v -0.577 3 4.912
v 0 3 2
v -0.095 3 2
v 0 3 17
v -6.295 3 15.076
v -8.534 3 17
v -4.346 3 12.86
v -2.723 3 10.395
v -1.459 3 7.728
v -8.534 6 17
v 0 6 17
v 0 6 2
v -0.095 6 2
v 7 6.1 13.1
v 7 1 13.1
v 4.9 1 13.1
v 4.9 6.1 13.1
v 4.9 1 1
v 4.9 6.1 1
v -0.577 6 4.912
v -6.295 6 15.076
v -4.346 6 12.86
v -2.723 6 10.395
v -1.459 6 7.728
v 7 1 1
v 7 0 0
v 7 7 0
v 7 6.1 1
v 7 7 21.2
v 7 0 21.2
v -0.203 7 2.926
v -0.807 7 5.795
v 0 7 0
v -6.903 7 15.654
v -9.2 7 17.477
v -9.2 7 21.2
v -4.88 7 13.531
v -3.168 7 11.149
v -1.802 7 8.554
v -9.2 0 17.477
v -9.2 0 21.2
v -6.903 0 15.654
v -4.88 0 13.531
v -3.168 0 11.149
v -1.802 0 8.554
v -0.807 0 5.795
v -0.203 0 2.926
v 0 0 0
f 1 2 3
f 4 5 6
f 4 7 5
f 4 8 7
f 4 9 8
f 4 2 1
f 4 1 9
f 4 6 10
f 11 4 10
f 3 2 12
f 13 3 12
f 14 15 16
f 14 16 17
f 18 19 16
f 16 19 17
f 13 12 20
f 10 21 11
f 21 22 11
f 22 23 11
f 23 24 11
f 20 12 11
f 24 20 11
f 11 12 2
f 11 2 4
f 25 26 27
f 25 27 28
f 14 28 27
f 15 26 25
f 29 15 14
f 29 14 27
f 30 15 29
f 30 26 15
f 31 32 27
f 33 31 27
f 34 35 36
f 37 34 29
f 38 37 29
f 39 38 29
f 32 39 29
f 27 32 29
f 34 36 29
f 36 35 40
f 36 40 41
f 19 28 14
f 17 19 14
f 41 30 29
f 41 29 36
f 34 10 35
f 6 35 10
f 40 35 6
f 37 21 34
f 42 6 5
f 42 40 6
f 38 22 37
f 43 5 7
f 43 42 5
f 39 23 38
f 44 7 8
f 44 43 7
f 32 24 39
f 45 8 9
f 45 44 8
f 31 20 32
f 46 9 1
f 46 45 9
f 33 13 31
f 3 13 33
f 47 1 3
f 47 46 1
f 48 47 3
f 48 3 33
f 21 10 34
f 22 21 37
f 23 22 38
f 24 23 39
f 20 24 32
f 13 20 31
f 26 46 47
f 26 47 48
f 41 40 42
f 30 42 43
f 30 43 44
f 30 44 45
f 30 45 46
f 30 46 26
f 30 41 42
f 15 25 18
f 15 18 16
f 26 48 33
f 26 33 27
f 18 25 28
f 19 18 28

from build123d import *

# Parameters (mm, degrees)
BOSS_EXTRUDE1_DEPTH = 7
CUT_EXTRUDE1_DEPTH  = 8
SKETCH5_W           = 15
SKETCH5_H           = 3
CUT_EXTRUDE3_DEPTH  = 10
SKETCH6_W           = 12.1
SKETCH6_H           = 5.1
CUT_EXTRUDE4_DEPTH  = 2.1


with BuildPart() as part:
    # Sketch1 → Boss-Extrude1 (new body)
    with BuildSketch(Plane(origin=(0, 0, 0), x_dir=(1, 0, 0), z_dir=(0, 1, 0))):
        with BuildLine():
            Line((7, 21.2), (-21.2, 21.2))
            ThreePointArc((-21.2, 21.2), (-6.209336239, 14.990663761), (0, 0))
            Line((0, 0), (7, 0))
            Line((7, 0), (7, 21.2))
        make_face()
    extrude(amount=BOSS_EXTRUDE1_DEPTH)

    # Sketch2 → Cut-Extrude1 (cut, through all)
    with BuildSketch(Plane(origin=(0, 7, 0), x_dir=(1, 0, 0), z_dir=(0, 1, 0))):
        with BuildLine():
            Line((-9.2, 17.47684182), (-9.2, 21.2))
            Line((-9.2, 21.2), (-21.2, 21.2))
            ThreePointArc((-21.2, 21.2), (-14.917844581, 20.247827619), (-9.2, 17.47684182))
        make_face()
    extrude(amount=-CUT_EXTRUDE1_DEPTH, mode=Mode.SUBTRACT)

    # Sketch5 → Cut-Extrude3 (cut)
    with BuildSketch(Plane(origin=(0, 0, 0), x_dir=(0, 0, -1), z_dir=(1, 0, 0))):
        with Locations((9.5, 4.5)):
            Rectangle(SKETCH5_W, SKETCH5_H)
    extrude(amount=-CUT_EXTRUDE3_DEPTH, mode=Mode.SUBTRACT)

    # Sketch6 → Cut-Extrude4 (cut)
    with BuildSketch(Plane(origin=(7, 0, 0), x_dir=(0, 0, -1), z_dir=(1, 0, 0))):
        with Locations((7.05, 3.55)):
            Rectangle(SKETCH6_W, SKETCH6_H)
    extrude(amount=-CUT_EXTRUDE4_DEPTH, mode=Mode.SUBTRACT)


with BuildPart() as body_2:
    # Mirror1: mirrored copy
    add(part.part.mirror(Plane(origin=(0, 7, 0), x_dir=(1, 0, 0), z_dir=(0, 0, -1))))


solid = body_2.part
